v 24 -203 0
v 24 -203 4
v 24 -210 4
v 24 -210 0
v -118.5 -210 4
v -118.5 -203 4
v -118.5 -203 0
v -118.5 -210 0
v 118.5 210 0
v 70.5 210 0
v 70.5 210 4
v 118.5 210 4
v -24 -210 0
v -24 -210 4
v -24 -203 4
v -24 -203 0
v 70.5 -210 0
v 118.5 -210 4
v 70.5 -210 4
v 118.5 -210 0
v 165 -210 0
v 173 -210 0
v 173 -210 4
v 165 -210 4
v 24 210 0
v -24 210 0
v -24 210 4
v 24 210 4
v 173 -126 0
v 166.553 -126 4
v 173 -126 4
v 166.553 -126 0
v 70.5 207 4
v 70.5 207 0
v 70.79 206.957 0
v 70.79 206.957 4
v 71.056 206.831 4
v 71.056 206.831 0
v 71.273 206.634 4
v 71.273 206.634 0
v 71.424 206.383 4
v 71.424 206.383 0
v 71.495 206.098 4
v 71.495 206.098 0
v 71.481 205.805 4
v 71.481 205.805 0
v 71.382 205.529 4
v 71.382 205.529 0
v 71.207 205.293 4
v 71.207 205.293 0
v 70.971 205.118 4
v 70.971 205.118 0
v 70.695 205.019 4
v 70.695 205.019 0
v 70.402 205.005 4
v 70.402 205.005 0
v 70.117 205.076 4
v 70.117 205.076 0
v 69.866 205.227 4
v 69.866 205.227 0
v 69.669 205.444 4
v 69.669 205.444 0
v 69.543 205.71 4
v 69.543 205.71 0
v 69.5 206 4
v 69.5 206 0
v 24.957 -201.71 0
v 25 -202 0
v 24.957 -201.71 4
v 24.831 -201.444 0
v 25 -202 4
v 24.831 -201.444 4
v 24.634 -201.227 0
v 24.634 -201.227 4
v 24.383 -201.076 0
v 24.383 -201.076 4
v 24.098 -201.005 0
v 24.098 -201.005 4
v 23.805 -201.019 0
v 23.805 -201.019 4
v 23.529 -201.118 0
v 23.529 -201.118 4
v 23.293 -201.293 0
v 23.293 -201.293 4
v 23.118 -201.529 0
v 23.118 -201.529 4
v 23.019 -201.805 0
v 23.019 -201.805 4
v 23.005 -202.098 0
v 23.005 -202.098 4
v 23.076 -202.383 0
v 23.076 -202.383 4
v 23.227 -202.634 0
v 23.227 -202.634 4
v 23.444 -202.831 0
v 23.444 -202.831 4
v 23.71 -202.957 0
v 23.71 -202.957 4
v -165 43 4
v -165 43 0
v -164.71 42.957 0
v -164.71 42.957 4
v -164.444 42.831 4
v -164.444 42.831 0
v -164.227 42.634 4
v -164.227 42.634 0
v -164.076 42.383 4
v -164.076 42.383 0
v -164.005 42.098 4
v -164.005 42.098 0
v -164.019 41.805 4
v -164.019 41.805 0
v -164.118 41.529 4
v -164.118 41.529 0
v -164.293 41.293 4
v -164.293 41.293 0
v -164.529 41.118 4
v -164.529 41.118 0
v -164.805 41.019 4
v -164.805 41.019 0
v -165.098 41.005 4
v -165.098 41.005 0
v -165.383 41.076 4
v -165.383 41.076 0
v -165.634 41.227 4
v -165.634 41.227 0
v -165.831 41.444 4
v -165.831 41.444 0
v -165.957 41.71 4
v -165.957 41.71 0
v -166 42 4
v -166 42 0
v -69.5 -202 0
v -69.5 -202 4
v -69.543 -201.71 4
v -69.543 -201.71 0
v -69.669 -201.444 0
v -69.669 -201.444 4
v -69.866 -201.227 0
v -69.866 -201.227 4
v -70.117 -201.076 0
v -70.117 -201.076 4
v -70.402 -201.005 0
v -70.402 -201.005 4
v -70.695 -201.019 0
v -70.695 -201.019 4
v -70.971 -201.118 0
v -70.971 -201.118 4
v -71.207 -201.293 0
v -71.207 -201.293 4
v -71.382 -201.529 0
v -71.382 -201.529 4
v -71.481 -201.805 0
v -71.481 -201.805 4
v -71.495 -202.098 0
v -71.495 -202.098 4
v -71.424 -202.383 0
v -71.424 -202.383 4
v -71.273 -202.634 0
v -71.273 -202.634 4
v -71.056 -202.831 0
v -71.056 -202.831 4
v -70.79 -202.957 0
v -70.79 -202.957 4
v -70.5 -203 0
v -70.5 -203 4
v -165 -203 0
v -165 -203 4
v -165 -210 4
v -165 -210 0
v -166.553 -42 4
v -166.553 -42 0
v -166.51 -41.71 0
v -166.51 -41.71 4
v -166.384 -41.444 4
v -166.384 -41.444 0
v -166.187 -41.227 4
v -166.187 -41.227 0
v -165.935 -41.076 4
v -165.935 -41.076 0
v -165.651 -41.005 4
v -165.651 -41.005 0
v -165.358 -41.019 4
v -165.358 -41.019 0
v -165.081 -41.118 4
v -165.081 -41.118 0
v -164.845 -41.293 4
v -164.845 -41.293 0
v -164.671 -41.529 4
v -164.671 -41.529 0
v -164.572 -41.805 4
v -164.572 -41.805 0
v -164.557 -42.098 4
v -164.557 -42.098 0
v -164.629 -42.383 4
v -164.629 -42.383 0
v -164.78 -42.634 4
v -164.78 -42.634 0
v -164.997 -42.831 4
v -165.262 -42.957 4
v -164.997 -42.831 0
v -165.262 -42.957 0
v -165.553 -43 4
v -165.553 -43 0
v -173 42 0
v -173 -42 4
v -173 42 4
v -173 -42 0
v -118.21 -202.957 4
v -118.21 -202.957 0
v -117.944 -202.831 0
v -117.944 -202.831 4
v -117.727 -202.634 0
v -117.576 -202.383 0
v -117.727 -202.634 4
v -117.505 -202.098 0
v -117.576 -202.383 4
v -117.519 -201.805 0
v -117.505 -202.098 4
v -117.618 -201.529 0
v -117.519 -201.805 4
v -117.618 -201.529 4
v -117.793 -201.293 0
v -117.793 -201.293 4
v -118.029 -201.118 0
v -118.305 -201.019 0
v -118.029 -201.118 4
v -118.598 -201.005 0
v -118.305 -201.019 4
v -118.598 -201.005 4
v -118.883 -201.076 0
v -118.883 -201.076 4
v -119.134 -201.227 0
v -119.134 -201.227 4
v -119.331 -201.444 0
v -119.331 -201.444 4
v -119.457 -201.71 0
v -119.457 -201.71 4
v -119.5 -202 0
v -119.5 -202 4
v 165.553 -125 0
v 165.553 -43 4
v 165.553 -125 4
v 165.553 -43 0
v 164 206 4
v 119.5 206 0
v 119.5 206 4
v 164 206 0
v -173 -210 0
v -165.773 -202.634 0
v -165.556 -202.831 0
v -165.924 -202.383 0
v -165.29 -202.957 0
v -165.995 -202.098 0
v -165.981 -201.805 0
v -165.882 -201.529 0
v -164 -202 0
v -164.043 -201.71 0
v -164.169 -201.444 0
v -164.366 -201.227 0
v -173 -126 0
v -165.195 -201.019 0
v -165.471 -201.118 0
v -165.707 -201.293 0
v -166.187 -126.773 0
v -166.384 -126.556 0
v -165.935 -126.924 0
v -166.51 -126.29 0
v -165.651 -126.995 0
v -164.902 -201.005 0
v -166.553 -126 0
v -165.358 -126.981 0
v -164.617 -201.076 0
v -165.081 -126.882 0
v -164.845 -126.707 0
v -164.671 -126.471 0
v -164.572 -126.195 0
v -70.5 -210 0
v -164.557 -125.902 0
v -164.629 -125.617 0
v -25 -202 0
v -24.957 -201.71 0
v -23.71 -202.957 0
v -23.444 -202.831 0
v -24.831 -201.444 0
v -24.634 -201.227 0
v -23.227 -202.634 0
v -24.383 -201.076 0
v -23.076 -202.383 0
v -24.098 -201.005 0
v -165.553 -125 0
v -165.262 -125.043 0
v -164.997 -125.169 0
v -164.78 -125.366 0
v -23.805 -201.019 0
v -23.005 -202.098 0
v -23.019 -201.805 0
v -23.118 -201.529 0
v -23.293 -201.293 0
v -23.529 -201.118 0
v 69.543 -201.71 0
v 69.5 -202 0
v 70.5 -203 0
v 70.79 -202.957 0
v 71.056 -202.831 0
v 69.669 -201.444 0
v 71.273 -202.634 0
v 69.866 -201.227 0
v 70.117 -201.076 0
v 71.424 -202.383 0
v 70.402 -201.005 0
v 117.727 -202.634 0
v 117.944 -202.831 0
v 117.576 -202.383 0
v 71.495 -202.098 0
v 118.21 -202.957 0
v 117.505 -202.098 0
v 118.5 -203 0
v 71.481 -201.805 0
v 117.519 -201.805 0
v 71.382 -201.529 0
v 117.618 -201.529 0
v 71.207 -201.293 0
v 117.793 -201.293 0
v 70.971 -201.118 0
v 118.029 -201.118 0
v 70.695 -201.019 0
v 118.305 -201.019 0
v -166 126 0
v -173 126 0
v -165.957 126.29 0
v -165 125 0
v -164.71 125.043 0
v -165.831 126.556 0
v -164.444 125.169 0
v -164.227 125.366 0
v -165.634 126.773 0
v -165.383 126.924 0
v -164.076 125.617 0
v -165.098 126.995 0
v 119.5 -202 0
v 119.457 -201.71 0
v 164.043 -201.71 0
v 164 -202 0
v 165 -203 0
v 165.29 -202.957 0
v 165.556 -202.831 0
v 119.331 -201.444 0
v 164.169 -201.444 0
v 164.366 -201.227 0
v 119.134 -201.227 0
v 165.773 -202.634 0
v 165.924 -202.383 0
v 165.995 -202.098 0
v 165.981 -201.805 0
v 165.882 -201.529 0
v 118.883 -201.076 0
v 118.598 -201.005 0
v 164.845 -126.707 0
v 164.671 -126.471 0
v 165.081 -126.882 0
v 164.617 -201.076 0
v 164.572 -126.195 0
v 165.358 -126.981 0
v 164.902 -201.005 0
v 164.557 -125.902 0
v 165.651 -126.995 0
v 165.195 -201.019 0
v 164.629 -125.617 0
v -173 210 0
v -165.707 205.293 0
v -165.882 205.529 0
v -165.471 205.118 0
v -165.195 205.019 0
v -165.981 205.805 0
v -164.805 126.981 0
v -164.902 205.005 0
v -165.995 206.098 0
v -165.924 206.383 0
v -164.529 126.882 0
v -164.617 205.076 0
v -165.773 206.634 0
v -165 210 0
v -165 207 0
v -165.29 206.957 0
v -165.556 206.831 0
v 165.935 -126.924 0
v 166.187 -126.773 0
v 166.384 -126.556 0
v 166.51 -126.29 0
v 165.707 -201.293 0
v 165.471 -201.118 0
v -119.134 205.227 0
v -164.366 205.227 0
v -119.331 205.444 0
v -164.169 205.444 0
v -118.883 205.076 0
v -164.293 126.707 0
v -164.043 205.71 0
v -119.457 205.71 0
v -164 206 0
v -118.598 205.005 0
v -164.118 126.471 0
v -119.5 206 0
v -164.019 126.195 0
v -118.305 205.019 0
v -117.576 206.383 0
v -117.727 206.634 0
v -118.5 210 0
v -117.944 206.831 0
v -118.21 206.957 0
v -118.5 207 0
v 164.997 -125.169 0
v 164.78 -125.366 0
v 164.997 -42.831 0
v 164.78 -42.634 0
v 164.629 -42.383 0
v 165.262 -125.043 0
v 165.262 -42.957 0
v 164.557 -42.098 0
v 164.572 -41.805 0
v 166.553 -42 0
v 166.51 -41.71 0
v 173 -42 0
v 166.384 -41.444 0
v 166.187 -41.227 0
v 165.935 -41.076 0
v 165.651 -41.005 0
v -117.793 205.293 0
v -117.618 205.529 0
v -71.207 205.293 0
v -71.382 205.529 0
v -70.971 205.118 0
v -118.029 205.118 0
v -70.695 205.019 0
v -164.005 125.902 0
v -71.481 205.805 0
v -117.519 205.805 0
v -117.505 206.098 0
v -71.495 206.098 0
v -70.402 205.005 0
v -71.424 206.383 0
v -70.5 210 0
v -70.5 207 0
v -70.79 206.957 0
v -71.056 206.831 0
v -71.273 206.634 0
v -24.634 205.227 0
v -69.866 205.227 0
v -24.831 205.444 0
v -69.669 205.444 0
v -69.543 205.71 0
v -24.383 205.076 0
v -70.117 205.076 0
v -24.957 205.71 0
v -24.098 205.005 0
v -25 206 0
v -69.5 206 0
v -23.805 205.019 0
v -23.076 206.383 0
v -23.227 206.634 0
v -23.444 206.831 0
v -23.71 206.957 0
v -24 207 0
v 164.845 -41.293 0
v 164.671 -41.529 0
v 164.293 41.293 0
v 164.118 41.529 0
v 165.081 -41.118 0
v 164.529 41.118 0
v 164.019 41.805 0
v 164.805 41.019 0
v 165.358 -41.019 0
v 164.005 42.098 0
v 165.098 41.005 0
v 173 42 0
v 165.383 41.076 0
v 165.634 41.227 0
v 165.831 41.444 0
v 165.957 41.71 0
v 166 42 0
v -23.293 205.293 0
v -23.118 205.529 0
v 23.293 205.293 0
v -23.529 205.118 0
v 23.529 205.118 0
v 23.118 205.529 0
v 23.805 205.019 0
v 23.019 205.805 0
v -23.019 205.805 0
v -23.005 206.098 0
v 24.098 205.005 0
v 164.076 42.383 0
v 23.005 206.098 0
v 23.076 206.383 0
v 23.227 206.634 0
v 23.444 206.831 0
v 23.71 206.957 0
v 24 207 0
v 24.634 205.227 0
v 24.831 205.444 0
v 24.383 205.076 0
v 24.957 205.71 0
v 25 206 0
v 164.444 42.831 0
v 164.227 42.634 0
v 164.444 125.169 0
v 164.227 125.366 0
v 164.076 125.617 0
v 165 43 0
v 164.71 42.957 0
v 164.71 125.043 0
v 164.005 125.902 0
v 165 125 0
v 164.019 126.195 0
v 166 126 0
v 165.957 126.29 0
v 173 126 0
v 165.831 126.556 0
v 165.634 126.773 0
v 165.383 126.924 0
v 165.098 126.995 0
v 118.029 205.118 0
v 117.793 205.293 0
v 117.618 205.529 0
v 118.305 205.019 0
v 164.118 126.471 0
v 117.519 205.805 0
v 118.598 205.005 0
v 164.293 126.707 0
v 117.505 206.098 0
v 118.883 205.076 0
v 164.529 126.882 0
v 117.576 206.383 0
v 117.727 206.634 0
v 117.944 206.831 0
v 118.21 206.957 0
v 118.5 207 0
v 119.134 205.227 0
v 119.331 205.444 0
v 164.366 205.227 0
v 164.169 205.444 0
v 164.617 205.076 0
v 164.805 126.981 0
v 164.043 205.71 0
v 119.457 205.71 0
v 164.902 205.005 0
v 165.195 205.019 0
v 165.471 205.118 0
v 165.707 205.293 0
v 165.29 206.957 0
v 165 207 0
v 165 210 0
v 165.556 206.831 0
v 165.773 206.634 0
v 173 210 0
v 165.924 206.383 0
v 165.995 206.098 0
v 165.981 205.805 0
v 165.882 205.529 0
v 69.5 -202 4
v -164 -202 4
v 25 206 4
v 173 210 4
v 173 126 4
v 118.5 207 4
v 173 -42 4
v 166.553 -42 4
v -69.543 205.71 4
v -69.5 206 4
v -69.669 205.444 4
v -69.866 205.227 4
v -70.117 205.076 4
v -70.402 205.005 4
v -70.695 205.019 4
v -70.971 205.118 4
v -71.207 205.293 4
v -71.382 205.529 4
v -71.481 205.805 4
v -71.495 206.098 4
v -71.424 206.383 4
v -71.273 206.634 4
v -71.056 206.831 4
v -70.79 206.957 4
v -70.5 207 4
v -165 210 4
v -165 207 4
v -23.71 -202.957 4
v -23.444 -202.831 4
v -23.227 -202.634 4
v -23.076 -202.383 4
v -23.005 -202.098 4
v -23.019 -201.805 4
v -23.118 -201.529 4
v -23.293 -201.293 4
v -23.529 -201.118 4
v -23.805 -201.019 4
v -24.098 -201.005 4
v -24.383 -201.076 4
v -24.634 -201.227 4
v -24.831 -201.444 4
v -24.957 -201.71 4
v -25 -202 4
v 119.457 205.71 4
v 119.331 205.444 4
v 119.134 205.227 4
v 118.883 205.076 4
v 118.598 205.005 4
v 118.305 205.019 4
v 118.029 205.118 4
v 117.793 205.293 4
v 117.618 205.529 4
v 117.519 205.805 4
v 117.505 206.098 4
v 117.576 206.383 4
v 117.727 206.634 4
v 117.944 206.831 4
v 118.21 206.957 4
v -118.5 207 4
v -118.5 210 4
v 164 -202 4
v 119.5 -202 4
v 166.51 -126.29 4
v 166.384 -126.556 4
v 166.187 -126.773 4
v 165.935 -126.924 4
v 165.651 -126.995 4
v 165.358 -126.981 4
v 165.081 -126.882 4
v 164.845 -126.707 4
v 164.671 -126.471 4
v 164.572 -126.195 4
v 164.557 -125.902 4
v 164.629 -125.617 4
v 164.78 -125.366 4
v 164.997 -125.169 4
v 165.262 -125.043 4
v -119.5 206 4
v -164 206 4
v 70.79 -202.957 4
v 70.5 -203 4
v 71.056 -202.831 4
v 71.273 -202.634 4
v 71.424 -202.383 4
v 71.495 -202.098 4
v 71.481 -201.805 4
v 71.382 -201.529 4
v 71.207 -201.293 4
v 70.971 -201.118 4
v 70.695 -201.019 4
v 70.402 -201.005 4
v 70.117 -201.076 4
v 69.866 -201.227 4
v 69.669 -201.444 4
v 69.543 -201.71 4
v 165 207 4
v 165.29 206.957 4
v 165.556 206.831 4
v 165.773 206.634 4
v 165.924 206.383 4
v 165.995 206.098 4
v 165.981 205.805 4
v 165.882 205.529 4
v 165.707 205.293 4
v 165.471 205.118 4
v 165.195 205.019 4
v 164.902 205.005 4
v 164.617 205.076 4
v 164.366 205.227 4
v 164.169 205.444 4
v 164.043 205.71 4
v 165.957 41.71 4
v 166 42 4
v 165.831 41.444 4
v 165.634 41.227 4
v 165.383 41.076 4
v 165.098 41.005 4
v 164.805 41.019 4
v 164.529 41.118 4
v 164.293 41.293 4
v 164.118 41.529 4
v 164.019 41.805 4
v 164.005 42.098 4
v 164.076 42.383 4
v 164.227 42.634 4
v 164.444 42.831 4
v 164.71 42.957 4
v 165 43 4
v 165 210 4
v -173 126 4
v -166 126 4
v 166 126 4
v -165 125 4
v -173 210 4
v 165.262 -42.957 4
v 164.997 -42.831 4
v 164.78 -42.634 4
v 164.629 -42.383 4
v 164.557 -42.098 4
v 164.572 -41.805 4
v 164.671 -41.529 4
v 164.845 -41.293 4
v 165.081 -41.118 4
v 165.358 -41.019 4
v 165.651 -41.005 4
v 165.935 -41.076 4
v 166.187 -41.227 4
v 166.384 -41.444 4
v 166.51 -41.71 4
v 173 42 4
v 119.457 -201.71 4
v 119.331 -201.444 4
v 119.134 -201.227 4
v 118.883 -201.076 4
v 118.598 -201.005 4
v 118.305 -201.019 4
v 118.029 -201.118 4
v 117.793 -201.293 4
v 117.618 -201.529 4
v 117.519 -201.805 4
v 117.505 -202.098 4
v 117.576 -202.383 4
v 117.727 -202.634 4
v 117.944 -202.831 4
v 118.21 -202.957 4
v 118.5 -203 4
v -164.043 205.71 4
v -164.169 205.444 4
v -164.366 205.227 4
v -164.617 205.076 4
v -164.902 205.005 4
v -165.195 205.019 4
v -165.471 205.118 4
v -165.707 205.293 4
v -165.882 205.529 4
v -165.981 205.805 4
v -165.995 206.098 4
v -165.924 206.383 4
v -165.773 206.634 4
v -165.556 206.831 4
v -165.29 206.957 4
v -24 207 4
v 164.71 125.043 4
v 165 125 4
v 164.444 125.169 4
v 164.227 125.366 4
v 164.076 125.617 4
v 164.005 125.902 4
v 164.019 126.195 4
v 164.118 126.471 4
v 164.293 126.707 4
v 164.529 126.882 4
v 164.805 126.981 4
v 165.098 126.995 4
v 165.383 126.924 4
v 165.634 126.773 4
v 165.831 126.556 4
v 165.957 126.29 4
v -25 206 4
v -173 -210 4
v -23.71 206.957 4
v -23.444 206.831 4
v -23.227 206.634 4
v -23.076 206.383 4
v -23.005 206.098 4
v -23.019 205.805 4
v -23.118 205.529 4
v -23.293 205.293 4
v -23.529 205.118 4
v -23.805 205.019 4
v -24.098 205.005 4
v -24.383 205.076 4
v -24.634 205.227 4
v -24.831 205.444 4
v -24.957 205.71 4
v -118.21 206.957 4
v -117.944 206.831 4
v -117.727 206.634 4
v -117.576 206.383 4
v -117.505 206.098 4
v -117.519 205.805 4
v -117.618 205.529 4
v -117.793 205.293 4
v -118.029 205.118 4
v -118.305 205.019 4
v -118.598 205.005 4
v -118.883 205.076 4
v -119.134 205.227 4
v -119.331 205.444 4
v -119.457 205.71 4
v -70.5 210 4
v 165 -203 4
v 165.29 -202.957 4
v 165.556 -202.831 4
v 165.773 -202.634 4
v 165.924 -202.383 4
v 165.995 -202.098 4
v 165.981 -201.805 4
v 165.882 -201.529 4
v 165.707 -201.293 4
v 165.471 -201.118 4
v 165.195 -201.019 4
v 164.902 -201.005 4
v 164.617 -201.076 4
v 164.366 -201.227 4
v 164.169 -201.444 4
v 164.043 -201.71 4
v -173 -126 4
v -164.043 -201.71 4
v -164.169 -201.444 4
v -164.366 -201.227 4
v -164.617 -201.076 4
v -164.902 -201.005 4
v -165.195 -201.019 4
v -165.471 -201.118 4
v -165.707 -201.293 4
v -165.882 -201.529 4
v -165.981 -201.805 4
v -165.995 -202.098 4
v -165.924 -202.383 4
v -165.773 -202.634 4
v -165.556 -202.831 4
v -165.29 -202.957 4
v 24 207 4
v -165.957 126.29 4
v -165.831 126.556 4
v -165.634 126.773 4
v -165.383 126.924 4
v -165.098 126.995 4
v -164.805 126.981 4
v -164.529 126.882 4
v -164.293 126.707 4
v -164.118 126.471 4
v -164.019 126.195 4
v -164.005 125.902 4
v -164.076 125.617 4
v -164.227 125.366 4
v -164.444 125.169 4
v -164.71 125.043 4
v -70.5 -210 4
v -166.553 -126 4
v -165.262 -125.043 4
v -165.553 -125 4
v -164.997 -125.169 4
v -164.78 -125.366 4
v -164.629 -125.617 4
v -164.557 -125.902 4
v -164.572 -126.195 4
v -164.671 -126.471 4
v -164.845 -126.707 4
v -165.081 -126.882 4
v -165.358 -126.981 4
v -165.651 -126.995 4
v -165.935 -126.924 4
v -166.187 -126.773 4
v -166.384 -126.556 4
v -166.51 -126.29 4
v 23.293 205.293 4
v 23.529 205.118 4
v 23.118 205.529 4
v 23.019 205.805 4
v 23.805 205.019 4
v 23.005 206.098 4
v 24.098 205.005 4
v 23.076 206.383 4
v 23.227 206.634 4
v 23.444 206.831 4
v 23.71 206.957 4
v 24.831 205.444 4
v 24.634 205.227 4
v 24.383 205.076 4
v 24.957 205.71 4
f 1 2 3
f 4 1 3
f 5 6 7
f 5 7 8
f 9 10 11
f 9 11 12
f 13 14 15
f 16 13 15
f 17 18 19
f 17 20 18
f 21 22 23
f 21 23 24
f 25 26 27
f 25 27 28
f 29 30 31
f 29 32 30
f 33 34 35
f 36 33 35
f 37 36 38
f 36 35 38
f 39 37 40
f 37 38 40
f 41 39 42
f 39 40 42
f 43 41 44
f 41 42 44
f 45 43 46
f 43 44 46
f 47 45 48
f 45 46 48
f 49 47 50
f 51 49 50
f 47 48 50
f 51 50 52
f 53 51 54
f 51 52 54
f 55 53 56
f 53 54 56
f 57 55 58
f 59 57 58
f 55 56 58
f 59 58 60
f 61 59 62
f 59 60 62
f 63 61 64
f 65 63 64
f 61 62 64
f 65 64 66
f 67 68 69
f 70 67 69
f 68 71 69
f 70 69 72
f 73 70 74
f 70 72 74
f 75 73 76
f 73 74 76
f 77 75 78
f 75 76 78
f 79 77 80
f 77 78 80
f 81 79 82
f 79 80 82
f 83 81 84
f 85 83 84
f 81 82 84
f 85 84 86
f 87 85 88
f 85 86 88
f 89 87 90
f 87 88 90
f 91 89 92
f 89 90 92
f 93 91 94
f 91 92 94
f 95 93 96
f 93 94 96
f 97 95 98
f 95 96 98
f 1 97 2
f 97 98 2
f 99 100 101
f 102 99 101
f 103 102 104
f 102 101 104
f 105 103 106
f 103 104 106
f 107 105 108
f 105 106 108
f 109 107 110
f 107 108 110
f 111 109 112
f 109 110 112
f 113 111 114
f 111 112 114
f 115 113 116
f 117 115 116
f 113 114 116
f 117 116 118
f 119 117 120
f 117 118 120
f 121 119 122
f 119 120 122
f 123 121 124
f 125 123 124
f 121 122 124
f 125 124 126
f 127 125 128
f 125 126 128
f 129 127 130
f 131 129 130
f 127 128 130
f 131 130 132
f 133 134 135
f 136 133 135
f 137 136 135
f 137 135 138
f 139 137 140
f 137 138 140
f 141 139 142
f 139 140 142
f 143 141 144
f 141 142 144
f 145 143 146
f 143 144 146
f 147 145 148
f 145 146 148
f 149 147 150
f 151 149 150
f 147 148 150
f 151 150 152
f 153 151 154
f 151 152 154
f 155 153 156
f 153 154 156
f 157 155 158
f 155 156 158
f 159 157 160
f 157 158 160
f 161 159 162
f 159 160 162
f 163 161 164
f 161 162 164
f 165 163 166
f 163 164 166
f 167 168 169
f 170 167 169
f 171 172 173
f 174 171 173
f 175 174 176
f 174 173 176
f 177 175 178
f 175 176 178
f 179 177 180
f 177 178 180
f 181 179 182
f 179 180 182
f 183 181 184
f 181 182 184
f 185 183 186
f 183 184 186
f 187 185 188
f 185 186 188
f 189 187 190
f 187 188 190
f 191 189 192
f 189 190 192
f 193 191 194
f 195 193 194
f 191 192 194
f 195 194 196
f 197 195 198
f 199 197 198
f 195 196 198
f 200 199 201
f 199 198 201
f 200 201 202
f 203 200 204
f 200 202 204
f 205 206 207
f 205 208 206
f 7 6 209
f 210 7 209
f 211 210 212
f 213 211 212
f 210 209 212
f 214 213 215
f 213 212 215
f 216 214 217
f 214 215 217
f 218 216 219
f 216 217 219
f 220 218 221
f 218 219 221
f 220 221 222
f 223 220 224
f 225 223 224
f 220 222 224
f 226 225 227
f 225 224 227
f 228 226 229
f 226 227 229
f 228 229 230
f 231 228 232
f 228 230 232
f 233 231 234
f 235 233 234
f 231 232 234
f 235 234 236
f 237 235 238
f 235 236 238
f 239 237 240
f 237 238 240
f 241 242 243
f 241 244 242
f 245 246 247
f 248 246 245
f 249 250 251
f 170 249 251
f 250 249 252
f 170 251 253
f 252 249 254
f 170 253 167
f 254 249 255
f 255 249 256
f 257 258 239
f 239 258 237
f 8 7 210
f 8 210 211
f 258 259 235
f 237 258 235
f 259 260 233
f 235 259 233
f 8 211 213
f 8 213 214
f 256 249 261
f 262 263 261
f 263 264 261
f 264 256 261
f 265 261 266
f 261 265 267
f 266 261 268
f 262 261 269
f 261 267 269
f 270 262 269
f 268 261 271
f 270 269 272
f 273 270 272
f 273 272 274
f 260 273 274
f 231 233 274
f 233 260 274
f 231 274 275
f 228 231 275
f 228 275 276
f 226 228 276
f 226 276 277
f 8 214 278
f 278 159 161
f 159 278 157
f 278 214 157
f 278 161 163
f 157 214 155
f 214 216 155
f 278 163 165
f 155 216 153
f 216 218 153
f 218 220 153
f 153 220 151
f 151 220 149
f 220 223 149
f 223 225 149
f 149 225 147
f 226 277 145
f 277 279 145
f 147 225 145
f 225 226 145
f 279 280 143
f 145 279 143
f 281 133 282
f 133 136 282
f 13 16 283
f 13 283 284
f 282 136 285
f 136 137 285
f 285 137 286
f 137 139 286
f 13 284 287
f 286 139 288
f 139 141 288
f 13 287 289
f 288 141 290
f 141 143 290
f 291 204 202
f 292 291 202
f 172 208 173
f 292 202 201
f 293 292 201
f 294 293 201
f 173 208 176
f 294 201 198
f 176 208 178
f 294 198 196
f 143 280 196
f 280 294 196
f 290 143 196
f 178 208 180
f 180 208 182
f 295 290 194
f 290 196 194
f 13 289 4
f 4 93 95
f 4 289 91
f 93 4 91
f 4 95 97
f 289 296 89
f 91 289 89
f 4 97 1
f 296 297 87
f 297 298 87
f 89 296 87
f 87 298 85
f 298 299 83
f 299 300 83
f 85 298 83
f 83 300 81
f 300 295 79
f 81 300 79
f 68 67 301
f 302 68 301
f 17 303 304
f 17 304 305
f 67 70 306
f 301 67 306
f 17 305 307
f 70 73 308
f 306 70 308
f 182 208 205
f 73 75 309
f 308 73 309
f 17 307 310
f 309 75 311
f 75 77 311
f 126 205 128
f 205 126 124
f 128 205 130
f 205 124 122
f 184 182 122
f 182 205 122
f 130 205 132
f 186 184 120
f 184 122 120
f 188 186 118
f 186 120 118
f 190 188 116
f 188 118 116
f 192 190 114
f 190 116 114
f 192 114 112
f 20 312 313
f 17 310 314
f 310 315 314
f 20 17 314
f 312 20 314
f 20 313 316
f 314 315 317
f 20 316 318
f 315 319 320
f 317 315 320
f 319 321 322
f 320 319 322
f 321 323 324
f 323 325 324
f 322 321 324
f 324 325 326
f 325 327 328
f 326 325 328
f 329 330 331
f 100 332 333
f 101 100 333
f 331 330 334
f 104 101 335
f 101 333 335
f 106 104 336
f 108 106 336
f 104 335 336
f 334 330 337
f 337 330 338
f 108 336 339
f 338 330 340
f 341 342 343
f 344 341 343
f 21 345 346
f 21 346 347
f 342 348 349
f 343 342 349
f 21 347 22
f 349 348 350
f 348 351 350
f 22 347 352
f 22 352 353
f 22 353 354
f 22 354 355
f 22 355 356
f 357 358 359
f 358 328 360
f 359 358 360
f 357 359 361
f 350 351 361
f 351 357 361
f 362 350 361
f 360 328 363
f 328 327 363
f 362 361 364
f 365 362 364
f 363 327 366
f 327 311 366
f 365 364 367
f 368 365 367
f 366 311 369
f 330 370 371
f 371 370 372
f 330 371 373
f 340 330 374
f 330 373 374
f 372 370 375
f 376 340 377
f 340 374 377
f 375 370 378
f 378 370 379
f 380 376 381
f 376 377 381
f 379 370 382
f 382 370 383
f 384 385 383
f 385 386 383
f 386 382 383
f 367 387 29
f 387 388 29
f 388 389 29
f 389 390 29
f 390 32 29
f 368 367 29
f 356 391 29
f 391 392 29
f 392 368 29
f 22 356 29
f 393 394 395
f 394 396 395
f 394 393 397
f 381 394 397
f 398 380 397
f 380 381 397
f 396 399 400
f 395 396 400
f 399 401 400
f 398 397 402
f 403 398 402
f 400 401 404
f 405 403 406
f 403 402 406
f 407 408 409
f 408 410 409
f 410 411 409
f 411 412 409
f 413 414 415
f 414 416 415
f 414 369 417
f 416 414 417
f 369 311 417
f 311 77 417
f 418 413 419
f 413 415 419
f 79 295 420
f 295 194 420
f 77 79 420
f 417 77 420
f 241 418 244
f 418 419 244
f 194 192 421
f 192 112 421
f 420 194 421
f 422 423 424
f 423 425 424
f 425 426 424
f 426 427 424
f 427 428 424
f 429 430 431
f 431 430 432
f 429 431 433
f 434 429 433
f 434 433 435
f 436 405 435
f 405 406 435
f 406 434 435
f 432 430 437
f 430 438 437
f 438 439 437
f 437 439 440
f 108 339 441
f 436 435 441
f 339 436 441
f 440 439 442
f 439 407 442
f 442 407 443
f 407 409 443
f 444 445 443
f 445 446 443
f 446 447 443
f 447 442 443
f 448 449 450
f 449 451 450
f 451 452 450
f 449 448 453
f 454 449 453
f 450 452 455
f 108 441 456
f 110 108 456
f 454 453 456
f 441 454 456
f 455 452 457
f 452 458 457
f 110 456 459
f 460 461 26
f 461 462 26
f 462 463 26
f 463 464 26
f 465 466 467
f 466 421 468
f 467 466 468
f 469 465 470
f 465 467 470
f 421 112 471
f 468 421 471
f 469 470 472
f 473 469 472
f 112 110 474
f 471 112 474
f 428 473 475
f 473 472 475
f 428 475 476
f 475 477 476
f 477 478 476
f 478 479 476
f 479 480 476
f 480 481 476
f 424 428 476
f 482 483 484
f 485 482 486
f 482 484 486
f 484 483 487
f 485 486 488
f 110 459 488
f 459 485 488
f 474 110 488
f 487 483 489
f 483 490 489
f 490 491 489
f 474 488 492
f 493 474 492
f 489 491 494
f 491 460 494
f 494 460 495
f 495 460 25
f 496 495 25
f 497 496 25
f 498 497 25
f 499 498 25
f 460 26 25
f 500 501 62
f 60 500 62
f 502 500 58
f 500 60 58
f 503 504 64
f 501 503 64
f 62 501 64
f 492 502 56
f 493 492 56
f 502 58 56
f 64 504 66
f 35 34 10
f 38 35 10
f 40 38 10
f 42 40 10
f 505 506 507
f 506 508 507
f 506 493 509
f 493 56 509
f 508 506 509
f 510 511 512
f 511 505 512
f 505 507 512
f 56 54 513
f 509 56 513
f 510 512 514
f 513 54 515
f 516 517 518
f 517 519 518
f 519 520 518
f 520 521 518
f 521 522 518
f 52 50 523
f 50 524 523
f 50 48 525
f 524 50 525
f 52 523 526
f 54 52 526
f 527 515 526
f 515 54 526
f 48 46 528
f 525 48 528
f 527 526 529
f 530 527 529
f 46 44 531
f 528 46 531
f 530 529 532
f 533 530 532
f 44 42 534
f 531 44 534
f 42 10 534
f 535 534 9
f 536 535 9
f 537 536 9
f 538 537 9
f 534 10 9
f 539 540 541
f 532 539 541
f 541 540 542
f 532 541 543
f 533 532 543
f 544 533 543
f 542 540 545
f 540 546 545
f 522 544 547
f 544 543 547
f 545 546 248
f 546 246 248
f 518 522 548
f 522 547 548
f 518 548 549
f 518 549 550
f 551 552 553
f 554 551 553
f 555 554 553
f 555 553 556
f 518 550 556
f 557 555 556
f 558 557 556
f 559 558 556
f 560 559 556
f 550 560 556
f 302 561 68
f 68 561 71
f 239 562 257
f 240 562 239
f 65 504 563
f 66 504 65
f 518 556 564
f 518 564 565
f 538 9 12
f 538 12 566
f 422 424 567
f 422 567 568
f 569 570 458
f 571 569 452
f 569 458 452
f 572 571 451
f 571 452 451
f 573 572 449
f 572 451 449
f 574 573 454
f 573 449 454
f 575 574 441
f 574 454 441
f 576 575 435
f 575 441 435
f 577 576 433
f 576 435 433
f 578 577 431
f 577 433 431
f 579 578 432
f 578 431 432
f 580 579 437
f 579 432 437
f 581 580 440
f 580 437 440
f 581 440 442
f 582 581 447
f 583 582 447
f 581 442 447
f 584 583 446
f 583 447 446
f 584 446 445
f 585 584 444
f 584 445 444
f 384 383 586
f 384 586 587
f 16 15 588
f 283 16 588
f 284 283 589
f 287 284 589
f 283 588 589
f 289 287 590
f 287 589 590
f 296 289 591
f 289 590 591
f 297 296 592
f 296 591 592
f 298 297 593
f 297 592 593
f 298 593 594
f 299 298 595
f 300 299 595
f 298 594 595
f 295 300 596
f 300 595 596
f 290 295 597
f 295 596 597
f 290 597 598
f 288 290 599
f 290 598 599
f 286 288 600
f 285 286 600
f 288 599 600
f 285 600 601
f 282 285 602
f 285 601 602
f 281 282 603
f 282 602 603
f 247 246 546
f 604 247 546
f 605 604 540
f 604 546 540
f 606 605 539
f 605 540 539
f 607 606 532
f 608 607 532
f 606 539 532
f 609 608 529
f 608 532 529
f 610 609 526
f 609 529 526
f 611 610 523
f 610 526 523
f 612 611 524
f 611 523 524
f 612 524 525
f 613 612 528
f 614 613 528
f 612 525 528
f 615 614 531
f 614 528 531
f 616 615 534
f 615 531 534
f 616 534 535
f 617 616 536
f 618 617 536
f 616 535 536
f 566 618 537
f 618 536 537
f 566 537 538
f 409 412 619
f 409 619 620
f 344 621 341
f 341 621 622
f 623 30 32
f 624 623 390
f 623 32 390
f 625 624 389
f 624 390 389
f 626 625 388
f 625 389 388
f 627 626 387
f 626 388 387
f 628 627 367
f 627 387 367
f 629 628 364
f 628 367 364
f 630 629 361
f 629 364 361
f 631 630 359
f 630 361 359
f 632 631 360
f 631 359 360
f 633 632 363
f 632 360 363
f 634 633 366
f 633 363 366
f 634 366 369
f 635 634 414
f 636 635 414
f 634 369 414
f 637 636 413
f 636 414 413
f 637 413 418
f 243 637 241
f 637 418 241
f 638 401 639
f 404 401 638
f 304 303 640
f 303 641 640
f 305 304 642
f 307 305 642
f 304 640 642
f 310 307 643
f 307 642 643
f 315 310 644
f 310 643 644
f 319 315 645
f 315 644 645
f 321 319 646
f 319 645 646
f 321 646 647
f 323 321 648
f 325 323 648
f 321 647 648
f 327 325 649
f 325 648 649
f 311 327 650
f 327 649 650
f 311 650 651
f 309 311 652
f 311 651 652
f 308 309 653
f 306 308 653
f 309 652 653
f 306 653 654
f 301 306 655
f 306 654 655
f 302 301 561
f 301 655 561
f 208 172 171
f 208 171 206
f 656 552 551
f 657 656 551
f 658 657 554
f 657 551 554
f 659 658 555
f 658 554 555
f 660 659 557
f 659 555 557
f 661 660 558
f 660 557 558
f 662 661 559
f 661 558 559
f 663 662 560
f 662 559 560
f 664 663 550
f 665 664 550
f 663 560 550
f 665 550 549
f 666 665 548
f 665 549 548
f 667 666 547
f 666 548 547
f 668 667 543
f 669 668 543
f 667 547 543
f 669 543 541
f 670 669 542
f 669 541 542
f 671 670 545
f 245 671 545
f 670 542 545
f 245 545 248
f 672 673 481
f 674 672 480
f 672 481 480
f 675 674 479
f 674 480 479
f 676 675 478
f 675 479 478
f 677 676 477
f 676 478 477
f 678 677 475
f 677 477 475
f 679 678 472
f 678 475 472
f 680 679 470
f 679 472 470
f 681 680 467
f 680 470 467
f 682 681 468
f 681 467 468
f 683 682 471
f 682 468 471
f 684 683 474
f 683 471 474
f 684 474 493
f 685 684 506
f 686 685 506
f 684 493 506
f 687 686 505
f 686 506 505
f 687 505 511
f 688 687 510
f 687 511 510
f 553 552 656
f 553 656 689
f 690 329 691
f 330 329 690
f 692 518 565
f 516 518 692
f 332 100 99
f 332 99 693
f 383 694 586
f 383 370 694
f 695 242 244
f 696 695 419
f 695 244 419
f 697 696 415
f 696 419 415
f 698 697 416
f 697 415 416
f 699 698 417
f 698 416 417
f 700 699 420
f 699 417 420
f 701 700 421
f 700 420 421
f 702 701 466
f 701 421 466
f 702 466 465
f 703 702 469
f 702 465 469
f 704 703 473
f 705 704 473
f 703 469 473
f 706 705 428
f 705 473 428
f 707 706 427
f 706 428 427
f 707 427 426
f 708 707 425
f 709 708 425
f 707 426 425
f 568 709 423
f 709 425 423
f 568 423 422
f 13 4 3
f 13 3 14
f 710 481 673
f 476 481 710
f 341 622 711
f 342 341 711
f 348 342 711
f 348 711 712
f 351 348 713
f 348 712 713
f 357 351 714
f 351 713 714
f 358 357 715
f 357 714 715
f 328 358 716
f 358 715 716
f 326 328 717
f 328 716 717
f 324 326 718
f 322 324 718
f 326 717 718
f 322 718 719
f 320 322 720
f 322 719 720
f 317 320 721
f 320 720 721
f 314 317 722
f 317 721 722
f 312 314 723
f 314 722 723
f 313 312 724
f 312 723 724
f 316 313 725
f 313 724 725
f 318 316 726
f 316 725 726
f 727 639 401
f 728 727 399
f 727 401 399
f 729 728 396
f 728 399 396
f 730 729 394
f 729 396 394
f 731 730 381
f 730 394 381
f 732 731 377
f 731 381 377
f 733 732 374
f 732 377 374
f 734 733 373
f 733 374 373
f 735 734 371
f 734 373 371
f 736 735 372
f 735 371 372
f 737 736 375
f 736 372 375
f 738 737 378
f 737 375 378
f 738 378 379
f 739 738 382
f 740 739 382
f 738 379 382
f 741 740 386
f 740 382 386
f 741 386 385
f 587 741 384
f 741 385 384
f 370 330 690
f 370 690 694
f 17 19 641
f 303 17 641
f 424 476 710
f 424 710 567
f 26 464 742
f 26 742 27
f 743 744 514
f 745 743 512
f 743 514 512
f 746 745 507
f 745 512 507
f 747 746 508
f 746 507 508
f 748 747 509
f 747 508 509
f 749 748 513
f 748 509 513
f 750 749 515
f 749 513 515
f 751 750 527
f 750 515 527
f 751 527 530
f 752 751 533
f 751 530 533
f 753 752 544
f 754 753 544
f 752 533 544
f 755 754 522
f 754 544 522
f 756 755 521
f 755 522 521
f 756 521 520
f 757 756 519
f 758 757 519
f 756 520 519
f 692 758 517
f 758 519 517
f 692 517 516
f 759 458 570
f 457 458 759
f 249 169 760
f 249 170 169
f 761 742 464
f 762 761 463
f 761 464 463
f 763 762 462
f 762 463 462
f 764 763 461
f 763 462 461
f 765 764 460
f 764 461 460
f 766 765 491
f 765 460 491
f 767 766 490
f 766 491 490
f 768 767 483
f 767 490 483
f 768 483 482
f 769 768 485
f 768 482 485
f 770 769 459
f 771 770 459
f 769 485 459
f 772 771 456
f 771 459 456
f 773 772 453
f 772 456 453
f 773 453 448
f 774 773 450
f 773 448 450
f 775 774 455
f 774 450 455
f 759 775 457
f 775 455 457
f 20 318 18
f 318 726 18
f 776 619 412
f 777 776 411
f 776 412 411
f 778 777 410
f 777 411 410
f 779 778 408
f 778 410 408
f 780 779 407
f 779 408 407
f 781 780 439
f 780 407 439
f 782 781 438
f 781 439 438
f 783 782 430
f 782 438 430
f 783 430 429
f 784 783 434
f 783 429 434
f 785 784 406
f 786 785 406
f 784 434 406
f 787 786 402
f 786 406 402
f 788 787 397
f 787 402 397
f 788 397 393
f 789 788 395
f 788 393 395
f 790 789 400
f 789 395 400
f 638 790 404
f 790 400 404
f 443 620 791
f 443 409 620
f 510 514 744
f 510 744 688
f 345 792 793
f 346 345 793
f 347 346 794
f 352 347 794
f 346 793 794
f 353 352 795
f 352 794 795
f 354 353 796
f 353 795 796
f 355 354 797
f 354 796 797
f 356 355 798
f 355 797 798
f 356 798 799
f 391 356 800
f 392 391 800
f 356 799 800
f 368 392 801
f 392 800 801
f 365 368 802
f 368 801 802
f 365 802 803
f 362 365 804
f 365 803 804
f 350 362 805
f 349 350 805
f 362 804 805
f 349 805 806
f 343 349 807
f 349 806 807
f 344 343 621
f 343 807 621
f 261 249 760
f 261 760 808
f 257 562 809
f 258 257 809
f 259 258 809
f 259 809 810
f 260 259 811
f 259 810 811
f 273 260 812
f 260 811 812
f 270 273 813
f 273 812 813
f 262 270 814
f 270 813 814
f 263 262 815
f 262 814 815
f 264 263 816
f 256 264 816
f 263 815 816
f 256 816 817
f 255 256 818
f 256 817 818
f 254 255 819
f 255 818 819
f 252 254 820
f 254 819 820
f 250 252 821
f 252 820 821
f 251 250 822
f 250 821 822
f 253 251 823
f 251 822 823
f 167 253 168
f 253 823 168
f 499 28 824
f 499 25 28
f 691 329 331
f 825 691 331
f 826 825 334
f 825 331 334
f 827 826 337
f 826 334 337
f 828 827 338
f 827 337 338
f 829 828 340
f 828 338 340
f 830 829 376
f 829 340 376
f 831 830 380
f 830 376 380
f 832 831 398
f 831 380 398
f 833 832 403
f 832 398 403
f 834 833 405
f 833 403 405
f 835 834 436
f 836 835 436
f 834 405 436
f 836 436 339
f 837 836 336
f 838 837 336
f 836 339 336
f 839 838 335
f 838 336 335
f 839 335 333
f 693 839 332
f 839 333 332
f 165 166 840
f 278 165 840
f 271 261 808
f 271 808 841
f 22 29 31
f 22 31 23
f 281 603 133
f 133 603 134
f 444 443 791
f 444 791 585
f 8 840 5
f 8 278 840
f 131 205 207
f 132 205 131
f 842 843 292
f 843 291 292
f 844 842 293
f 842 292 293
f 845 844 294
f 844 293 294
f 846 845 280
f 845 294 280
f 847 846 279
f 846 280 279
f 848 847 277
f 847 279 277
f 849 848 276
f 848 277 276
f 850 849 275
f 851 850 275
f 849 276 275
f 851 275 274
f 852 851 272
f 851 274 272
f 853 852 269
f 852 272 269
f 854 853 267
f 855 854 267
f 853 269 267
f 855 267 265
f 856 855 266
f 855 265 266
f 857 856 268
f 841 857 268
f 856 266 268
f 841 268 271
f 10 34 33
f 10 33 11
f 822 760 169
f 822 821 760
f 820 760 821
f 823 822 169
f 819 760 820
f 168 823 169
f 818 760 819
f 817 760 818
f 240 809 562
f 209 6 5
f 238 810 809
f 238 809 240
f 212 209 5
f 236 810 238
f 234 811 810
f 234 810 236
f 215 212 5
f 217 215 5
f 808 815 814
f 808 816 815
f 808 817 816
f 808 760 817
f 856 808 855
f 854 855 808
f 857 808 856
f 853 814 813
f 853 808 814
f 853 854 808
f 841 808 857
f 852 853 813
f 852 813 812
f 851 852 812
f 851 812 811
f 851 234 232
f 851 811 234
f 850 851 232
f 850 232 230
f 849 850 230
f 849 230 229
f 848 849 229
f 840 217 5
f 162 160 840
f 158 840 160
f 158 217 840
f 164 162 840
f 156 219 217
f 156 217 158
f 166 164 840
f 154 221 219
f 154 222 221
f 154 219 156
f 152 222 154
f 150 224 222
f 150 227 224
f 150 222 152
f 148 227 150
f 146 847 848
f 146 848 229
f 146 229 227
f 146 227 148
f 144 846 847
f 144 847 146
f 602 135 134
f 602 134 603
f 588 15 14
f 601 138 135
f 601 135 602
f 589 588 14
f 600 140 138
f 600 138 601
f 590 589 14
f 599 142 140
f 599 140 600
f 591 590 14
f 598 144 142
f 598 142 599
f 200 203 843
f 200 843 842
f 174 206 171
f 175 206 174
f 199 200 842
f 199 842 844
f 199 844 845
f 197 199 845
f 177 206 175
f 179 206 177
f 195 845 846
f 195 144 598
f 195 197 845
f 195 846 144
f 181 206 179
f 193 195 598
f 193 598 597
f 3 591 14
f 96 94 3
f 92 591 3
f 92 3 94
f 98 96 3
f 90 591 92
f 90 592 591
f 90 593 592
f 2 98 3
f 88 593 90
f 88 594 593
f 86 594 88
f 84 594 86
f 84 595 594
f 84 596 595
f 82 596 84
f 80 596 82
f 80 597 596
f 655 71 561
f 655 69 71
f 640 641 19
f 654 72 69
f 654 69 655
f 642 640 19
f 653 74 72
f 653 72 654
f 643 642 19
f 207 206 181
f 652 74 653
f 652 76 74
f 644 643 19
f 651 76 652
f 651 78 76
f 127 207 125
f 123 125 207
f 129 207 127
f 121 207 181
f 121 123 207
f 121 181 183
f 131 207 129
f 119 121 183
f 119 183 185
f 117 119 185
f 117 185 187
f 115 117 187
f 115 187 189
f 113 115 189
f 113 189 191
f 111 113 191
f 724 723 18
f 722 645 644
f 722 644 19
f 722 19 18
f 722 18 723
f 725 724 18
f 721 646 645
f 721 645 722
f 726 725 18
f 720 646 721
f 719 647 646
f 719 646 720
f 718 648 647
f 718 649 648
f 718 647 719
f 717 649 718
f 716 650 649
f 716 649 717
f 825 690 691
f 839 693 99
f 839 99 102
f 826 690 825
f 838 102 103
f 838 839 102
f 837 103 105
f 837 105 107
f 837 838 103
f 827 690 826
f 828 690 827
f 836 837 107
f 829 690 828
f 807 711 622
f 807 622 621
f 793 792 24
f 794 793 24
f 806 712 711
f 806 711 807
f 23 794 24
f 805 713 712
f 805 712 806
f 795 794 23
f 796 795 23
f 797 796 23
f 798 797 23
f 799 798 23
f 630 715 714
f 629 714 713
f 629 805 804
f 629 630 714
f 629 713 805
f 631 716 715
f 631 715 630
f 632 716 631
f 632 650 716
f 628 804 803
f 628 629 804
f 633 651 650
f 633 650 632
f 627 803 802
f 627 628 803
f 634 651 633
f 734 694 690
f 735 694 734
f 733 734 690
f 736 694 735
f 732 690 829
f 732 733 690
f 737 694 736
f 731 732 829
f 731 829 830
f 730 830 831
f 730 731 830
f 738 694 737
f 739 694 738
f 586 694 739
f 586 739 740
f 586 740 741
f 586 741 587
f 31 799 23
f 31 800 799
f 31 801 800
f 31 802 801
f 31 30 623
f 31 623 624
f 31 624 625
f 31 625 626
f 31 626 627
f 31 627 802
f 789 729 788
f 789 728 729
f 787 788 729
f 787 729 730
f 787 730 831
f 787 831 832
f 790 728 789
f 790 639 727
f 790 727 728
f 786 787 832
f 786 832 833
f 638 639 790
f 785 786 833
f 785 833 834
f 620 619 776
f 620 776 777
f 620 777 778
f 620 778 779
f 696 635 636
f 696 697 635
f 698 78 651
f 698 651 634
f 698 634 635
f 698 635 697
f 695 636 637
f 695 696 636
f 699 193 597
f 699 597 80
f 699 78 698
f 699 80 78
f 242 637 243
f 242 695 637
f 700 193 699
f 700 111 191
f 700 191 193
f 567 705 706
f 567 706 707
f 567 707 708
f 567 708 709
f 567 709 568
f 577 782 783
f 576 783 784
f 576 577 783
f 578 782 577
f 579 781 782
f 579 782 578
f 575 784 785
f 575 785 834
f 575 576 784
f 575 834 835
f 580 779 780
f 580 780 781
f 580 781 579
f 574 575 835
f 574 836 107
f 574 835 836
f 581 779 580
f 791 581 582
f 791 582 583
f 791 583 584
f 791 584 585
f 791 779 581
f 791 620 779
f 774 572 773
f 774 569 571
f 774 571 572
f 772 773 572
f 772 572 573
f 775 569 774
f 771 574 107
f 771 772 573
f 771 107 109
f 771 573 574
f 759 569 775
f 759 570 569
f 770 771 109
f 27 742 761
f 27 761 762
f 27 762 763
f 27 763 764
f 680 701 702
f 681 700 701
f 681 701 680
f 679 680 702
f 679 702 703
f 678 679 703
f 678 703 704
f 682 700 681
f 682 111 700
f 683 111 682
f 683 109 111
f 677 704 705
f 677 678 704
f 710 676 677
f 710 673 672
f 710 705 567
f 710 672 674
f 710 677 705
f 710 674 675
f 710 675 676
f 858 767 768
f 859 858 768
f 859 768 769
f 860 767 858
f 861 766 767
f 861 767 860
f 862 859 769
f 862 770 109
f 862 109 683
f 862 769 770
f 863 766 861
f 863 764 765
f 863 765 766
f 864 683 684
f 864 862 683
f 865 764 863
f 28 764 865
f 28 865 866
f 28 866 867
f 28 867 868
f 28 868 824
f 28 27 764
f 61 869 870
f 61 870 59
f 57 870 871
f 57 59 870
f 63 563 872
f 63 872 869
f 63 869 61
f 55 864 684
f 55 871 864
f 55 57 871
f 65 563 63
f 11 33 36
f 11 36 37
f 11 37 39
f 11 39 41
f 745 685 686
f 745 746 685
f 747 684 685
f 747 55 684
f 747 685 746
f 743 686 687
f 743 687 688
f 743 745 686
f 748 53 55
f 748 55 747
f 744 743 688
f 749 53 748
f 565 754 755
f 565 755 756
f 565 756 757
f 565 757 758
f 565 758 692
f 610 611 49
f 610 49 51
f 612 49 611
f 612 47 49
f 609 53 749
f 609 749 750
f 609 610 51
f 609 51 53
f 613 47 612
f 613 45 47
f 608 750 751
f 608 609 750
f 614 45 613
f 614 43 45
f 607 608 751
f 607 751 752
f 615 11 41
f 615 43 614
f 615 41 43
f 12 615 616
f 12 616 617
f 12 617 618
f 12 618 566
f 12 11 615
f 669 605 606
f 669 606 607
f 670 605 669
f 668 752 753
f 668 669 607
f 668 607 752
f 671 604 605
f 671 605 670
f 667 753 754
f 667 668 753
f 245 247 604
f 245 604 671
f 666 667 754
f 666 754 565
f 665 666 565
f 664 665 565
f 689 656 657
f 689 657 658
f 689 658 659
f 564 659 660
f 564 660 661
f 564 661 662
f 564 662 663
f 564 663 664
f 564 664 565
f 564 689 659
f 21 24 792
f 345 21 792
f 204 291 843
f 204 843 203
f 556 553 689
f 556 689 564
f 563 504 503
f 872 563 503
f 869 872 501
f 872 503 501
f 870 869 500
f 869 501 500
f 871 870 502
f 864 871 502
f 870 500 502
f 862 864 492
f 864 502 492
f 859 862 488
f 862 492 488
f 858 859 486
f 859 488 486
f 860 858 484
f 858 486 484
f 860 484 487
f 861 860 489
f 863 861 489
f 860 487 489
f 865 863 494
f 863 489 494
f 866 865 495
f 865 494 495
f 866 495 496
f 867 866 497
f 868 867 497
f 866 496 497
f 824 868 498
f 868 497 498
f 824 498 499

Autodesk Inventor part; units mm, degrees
ref_plane "YZ Plane" through (0, 0, 0) normal (1, 0, 0) x (0, 1, 0)
ref_plane "XZ Plane" through (0, 0, 0) normal (0, 1, 0) x (-1, 0, 0)
ref_plane "XY Plane" through (0, 0, 0) normal (0, 0, 1) x (1, 0, 0)
sketch "Esboço1" plane through (0, 0, 0) normal (0, 0, 1) x (1, 0, 0)
  line L0 (-173, 210) -> (173, 210)
  line L1 (173, 210) -> (173, -210)
  line L2 (173, -210) -> (-173, -210)
  line L3 (-173, -210) -> (-173, 210)
  point P0 (0, 0)
  point P1 (173, 0)
  point P2 (0, 210)
  dimension "d0" = 420
  dimension "d1" = 346
extrude "Extrusão1" add sketch "Esboço1" along normal blind 4
sketch "Esboço2" plane through (0, 0, 4) normal (0, 0, 1) x (1, 0, 0)
  line L0 (-173, 210) -> (-173, -210) projected
  line L1 (-173, -210) -> (173, -210) projected
  line L2 (-165, -202) -> (-118.5, -202)
  line L3 (-118.5, -202) -> (-118.5, -210)
  line L4 (-118.5, -210) -> (-165, -210)
  line L5 (-70.5, -210) -> (-24, -210)
  line L6 (-24, -210) -> (-24, -202)
  line L7 (-24, -202) -> (-70.5, -202)
  line L8 (-70.5, -202) -> (-70.5, -210)
  line L9 (24, -210) -> (70.5, -210)
  line L10 (70.5, -210) -> (70.5, -202)
  line L11 (70.5, -202) -> (24, -202)
  line L12 (24, -202) -> (24, -210)
  line L13 (118.5, -210) -> (165, -210)
  line L14 (165, -210) -> (165, -202)
  line L15 (165, -202) -> (118.5, -202)
  line L16 (118.5, -202) -> (118.5, -210)
  circle A0 centre (-118.5, -202) radius 1
  circle A1 centre (-70.5, -202) radius 1
  circle A2 centre (-24, -202) radius 1
  circle A3 centre (24, -202) radius 1
  circle A4 centre (70.5, -202) radius 1
  circle A5 centre (118.5, -202) radius 1
  line L17 (173, -210) -> (173, 210) projected
  line L18 (-165, -202) -> (-165, -210)
  circle A6 centre (165, -202) radius 1
  circle A7 centre (-165, -202) radius 1
  point P0 (0, 0)
  dimension "d4" = 46.5
  dimension "d5" = 8
  dimension "d6" = 46.5
  dimension "d7" = 46.5
  dimension "d8" = 46.5
  dimension "d9" = 8
  dimension "d10" = 8
  dimension "d11" = 48
  dimension "d12" = 48
  dimension "d13" = 48
  dimension "d16" = 2
  dimension "d17" = 2
  dimension "d18" = 2
  dimension "d19" = 2
  dimension "d20" = 2
  dimension "d21" = 2
  dimension "d38" = 8
  dimension "d40" = 46.5
  dimension "d41" = 2
  dimension "d42" = 2
extrude "Extrusão2" cut sketch "Esboço2" against normal blind 10
sketch "Esboço3" plane through (0, 0, 0) normal (0, 0, -1) x (-1, 0, 0)
  line L0 (-173, 210) -> (173, 210) projected
  line L1 (-118.5, 210) -> (-118.5, 206)
  line L2 (-118.5, 206) -> (-165, 206)
  line L3 (-70.5, 210) -> (-24, 210)
  line L4 (-24, 210) -> (-24, 206)
  line L5 (-24, 206) -> (-70.5, 206)
  line L6 (-70.5, 206) -> (-70.5, 210)
  line L7 (173, -210) -> (173, 210) projected
  circle A0 centre (-118.5, 206) radius 1
  circle A1 centre (-70.5, 206) radius 1
  circle A2 centre (-24, 206) radius 1
  line L8 (-165, 206) -> (-165, 210)
  line L9 (-118.5, 210) -> (-165, 210)
  line L10 (173, 210) -> (-173, 210) projected
  line L11 (-173, 210) -> (-173, -210) projected
  circle A3 centre (-165, 206) radius 1
  point P0 (0, 0)
  point P1 (173, -202)
  dimension "d22" = 46.5
  dimension "d23" = 4
  dimension "d24" = 46.5
  dimension "d31" = 48
  dimension "d33" = 2
  dimension "d34" = 2
  dimension "d35" = 2
  dimension "d43" = 8
  dimension "d44" = 2
extrude "Extrusão3" cut sketch "Esboço3" against normal blind 10
mirror "Espelhamento1" about plane through (0, 0, 0) normal (1, 0, 0) of "Extrusão3"
sketch "Esboço4" plane through (0, 0, 0) normal (0, 0, -1) x (-1, 0, 0)
  line L0 (173.5526, -126) -> (165.5526, -126)
  line L1 (165.5526, -126) -> (165.5526, -42)
  line L2 (165.5526, -42) -> (173.5526, -42)
  line L3 (173.5526, -42) -> (173.5526, -126)
  line L4 (165, -210) -> (173, -210) projected
  line L5 (173, 210) -> (173, -210) projected
  line L6 (173, 42) -> (165, 42)
  line L7 (165, 42) -> (165, 126)
  line L8 (165, 126) -> (173, 126)
  line L9 (173, 126) -> (173, 42)
  line L10 (173, 210) -> (165, 210) projected
  circle A0 centre (165.5526, -42) radius 1
  circle A1 centre (165.5526, -126) radius 1
  circle A2 centre (165, 42) radius 1
  circle A3 centre (165, 126) radius 1
  point P0 (0, 0)
  dimension "d45" = 8
  dimension "d46" = 84
  dimension "d47" = 84
  dimension "d48" = 84
  dimension "d49" = 84
  dimension "d50" = 84
  dimension "d51" = 2
  dimension "d52" = 2
  dimension "d53" = 2
  dimension "d54" = 2
extrude "Extrusão4" cut sketch "Esboço4" against normal blind 10
mirror "Espelhamento2" about plane through (0, 0, 0) normal (1, 0, 0) of "Extrusão4"
properties part number "traseira"
